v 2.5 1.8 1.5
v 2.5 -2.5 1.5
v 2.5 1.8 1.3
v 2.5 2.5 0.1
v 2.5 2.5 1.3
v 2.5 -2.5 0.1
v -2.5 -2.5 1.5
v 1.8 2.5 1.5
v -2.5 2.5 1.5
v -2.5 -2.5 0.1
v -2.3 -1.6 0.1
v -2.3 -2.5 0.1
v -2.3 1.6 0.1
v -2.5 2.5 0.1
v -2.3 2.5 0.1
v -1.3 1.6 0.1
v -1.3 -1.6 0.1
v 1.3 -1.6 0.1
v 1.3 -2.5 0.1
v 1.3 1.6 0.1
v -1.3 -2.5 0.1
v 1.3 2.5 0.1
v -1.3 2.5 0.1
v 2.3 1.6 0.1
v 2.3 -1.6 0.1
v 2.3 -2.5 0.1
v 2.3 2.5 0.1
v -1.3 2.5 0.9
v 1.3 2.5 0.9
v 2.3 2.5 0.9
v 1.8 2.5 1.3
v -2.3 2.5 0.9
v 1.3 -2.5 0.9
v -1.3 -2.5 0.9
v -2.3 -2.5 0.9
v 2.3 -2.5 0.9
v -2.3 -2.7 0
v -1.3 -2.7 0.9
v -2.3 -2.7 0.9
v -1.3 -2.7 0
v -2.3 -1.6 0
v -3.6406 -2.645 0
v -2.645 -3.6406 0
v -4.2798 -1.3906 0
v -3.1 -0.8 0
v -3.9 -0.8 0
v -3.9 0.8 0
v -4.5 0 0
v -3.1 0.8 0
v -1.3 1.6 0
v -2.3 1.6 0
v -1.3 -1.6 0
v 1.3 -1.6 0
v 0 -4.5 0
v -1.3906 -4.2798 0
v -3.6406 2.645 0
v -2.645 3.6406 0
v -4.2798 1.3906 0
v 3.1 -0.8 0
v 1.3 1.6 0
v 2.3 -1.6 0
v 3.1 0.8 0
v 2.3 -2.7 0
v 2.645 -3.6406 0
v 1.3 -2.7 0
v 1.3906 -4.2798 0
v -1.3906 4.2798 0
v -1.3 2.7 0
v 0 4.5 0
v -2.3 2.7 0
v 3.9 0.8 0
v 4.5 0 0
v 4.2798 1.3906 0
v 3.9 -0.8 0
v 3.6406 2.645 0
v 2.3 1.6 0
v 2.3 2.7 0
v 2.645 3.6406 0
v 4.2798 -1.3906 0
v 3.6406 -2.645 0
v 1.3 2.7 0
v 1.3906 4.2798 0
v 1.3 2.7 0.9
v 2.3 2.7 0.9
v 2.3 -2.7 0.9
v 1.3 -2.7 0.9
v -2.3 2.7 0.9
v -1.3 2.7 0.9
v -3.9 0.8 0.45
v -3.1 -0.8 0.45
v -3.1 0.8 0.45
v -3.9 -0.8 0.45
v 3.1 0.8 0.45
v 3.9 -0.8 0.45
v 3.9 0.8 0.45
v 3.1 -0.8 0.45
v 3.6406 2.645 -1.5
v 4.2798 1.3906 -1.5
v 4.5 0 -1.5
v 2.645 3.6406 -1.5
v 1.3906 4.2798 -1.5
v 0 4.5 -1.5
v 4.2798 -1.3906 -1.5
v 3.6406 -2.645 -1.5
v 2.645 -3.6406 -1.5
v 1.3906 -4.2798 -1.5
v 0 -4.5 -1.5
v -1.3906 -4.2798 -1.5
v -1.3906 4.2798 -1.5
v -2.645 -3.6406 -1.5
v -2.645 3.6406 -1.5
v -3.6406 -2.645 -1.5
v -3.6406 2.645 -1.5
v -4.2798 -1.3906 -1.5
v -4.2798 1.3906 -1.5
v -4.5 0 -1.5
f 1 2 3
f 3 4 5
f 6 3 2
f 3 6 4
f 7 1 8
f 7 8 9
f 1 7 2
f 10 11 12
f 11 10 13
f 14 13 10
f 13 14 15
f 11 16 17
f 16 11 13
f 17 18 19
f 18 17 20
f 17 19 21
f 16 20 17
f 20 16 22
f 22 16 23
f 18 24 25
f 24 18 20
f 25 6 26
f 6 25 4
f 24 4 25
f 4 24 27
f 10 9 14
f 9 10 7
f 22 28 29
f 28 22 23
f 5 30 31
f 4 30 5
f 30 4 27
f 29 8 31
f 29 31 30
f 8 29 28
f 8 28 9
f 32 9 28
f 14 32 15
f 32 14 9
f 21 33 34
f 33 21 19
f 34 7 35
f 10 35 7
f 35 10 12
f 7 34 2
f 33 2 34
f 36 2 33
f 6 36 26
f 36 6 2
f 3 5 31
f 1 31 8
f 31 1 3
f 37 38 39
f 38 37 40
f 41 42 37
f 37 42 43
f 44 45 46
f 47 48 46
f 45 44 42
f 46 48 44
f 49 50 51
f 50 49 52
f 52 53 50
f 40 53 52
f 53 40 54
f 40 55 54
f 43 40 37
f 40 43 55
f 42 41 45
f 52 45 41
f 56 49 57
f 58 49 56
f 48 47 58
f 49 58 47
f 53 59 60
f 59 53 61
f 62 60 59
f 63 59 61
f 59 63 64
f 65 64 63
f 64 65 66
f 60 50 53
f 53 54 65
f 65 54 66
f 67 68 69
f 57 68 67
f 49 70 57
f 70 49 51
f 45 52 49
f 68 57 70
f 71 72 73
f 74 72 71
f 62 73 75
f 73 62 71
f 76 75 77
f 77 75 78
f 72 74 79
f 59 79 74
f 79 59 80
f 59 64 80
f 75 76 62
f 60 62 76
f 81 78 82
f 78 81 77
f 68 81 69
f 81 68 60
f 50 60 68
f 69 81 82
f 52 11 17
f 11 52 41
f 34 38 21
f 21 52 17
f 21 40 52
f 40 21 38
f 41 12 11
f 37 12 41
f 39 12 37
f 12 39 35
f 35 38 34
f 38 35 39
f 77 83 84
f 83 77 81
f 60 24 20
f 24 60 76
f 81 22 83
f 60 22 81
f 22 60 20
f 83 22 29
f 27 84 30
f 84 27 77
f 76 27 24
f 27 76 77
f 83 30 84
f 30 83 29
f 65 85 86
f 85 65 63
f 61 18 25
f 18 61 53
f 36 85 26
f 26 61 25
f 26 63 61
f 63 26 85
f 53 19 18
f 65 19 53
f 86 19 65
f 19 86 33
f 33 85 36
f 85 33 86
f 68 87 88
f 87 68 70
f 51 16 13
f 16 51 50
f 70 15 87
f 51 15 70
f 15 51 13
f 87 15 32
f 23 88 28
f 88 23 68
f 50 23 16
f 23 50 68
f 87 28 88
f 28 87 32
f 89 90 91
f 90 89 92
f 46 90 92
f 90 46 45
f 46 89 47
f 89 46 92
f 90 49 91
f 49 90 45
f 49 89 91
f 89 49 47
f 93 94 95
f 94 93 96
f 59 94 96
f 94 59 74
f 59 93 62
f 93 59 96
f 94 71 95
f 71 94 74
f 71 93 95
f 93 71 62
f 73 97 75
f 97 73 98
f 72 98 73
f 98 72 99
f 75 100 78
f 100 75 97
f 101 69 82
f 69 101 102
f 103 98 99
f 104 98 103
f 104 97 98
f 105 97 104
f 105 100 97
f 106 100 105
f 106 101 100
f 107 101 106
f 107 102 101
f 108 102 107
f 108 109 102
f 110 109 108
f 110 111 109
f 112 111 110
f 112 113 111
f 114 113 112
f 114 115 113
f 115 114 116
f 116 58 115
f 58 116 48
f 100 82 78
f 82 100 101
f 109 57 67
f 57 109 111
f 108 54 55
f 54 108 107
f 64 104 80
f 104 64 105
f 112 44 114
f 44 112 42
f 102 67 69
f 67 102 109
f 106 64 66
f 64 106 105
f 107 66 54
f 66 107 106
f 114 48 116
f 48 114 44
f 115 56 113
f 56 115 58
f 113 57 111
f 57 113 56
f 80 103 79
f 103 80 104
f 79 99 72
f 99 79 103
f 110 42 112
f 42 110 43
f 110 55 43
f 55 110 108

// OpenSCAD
$fn=20;
fudge=0.1;

LEDButton();

module dualLED(){
//https://datasheet.lcsc.com/lcsc/2311141648_MEIHUA-MHK2310GEBTD_C7470875.pdf
  translate([1.27,10/2-8.59,10/2]) cube([4.6,10,10],true);
  for (iz=[-1,1]){
    col = (iz<1) ? "red" : "green";
    color(col) translate([1.27,-8.59,10/2+iz*2.5]) rotate([90,0,0]){
      cylinder(d=2.9,h=2.8-2.9/2);
      translate([0,0,2.8-2.9/2]) sphere(d=2.9);
      }
    }
  color("grey") for (ix=[-1,1],iy=[0,-1])
    translate([ix*1.27+1.27,iy*2.54,-3]) linear_extrude(3) square(0.5,true);
}

module LEDButton(dia=9){
  PCBThck=1.5;
  LED5050();
  translate([0,0,-PCBThck]) cylinder(d=dia,h=PCBThck);
  for (ix=[-1,1]) 
    translate([ix*3.5,0,0]) rotate(90) r_SMD();
}

*r_SMD();
module r_SMD(size="0603"){
  //overall dimensions and contact width
  dims= (size=="0805") ? [2.0,1.25,0.50,0.35] : 
        (size=="0603") ? [1.6,0.80,0.45,0.25] : 
        (size=="0402") ? [1  ,0.50,0.35,0.20] :
        (size=="0201") ? [0.6,0.30,0.30,0.10] : [0.4,0.2,0.13,0.10];
  color("darkSlateGrey") translate([0,0,dims.z/2]) cube([dims.x-dims[3]*2,dims.y,dims.z],true);
  color("lightGrey") for (ix=[-1,1]) 
    translate([ix*(dims.x-dims[3])/2,0,dims.z/2]) 
      cube([dims[3],dims.y,dims.z],true);
}

module LED5050(pins=4){
  // e.g. WS2812(B)
  dims=[5,5,1.5];
  pitch= (pins==6) ? 0.9 : 1.8;
  grvHght=1;
  marking=[0.7,0.2]; //width,height
  
  //body
  color("ivory")
    difference(){
      translate([0,0,(dims.z+0.1)/2]) cube(dims-[0,0,0.1],true);
      translate([0,0,dims.z-grvHght]) cylinder(d1=3.2,d2=4,h=grvHght+0.01);
      //marking
      translate([dims.x/2,dims.y/2,dims.z-marking[1]]) linear_extrude(marking[1]+fudge)      
        polygon([[-marking.x-fudge,fudge],[fudge,fudge],[fudge,-marking.x-fudge]]);
    }
  color("grey",0.6)
    translate([0,0,dims.z-grvHght]) cylinder(d1=3.2,d2=4,h=grvHght);
  //leads
  color("silver")
    for (i=[-pins/2+1:2:pins/2],r=[-90,90])
      rotate([0,0,r]) translate([dims.x/2,i*pitch,0]){
        translate([-1.1/2+0.2,0,0.1]) cube([1.1,1.0,0.2],true);
        translate([0.1,0,0.45]) cube([0.2,1.0,0.9],true);
      }
}
